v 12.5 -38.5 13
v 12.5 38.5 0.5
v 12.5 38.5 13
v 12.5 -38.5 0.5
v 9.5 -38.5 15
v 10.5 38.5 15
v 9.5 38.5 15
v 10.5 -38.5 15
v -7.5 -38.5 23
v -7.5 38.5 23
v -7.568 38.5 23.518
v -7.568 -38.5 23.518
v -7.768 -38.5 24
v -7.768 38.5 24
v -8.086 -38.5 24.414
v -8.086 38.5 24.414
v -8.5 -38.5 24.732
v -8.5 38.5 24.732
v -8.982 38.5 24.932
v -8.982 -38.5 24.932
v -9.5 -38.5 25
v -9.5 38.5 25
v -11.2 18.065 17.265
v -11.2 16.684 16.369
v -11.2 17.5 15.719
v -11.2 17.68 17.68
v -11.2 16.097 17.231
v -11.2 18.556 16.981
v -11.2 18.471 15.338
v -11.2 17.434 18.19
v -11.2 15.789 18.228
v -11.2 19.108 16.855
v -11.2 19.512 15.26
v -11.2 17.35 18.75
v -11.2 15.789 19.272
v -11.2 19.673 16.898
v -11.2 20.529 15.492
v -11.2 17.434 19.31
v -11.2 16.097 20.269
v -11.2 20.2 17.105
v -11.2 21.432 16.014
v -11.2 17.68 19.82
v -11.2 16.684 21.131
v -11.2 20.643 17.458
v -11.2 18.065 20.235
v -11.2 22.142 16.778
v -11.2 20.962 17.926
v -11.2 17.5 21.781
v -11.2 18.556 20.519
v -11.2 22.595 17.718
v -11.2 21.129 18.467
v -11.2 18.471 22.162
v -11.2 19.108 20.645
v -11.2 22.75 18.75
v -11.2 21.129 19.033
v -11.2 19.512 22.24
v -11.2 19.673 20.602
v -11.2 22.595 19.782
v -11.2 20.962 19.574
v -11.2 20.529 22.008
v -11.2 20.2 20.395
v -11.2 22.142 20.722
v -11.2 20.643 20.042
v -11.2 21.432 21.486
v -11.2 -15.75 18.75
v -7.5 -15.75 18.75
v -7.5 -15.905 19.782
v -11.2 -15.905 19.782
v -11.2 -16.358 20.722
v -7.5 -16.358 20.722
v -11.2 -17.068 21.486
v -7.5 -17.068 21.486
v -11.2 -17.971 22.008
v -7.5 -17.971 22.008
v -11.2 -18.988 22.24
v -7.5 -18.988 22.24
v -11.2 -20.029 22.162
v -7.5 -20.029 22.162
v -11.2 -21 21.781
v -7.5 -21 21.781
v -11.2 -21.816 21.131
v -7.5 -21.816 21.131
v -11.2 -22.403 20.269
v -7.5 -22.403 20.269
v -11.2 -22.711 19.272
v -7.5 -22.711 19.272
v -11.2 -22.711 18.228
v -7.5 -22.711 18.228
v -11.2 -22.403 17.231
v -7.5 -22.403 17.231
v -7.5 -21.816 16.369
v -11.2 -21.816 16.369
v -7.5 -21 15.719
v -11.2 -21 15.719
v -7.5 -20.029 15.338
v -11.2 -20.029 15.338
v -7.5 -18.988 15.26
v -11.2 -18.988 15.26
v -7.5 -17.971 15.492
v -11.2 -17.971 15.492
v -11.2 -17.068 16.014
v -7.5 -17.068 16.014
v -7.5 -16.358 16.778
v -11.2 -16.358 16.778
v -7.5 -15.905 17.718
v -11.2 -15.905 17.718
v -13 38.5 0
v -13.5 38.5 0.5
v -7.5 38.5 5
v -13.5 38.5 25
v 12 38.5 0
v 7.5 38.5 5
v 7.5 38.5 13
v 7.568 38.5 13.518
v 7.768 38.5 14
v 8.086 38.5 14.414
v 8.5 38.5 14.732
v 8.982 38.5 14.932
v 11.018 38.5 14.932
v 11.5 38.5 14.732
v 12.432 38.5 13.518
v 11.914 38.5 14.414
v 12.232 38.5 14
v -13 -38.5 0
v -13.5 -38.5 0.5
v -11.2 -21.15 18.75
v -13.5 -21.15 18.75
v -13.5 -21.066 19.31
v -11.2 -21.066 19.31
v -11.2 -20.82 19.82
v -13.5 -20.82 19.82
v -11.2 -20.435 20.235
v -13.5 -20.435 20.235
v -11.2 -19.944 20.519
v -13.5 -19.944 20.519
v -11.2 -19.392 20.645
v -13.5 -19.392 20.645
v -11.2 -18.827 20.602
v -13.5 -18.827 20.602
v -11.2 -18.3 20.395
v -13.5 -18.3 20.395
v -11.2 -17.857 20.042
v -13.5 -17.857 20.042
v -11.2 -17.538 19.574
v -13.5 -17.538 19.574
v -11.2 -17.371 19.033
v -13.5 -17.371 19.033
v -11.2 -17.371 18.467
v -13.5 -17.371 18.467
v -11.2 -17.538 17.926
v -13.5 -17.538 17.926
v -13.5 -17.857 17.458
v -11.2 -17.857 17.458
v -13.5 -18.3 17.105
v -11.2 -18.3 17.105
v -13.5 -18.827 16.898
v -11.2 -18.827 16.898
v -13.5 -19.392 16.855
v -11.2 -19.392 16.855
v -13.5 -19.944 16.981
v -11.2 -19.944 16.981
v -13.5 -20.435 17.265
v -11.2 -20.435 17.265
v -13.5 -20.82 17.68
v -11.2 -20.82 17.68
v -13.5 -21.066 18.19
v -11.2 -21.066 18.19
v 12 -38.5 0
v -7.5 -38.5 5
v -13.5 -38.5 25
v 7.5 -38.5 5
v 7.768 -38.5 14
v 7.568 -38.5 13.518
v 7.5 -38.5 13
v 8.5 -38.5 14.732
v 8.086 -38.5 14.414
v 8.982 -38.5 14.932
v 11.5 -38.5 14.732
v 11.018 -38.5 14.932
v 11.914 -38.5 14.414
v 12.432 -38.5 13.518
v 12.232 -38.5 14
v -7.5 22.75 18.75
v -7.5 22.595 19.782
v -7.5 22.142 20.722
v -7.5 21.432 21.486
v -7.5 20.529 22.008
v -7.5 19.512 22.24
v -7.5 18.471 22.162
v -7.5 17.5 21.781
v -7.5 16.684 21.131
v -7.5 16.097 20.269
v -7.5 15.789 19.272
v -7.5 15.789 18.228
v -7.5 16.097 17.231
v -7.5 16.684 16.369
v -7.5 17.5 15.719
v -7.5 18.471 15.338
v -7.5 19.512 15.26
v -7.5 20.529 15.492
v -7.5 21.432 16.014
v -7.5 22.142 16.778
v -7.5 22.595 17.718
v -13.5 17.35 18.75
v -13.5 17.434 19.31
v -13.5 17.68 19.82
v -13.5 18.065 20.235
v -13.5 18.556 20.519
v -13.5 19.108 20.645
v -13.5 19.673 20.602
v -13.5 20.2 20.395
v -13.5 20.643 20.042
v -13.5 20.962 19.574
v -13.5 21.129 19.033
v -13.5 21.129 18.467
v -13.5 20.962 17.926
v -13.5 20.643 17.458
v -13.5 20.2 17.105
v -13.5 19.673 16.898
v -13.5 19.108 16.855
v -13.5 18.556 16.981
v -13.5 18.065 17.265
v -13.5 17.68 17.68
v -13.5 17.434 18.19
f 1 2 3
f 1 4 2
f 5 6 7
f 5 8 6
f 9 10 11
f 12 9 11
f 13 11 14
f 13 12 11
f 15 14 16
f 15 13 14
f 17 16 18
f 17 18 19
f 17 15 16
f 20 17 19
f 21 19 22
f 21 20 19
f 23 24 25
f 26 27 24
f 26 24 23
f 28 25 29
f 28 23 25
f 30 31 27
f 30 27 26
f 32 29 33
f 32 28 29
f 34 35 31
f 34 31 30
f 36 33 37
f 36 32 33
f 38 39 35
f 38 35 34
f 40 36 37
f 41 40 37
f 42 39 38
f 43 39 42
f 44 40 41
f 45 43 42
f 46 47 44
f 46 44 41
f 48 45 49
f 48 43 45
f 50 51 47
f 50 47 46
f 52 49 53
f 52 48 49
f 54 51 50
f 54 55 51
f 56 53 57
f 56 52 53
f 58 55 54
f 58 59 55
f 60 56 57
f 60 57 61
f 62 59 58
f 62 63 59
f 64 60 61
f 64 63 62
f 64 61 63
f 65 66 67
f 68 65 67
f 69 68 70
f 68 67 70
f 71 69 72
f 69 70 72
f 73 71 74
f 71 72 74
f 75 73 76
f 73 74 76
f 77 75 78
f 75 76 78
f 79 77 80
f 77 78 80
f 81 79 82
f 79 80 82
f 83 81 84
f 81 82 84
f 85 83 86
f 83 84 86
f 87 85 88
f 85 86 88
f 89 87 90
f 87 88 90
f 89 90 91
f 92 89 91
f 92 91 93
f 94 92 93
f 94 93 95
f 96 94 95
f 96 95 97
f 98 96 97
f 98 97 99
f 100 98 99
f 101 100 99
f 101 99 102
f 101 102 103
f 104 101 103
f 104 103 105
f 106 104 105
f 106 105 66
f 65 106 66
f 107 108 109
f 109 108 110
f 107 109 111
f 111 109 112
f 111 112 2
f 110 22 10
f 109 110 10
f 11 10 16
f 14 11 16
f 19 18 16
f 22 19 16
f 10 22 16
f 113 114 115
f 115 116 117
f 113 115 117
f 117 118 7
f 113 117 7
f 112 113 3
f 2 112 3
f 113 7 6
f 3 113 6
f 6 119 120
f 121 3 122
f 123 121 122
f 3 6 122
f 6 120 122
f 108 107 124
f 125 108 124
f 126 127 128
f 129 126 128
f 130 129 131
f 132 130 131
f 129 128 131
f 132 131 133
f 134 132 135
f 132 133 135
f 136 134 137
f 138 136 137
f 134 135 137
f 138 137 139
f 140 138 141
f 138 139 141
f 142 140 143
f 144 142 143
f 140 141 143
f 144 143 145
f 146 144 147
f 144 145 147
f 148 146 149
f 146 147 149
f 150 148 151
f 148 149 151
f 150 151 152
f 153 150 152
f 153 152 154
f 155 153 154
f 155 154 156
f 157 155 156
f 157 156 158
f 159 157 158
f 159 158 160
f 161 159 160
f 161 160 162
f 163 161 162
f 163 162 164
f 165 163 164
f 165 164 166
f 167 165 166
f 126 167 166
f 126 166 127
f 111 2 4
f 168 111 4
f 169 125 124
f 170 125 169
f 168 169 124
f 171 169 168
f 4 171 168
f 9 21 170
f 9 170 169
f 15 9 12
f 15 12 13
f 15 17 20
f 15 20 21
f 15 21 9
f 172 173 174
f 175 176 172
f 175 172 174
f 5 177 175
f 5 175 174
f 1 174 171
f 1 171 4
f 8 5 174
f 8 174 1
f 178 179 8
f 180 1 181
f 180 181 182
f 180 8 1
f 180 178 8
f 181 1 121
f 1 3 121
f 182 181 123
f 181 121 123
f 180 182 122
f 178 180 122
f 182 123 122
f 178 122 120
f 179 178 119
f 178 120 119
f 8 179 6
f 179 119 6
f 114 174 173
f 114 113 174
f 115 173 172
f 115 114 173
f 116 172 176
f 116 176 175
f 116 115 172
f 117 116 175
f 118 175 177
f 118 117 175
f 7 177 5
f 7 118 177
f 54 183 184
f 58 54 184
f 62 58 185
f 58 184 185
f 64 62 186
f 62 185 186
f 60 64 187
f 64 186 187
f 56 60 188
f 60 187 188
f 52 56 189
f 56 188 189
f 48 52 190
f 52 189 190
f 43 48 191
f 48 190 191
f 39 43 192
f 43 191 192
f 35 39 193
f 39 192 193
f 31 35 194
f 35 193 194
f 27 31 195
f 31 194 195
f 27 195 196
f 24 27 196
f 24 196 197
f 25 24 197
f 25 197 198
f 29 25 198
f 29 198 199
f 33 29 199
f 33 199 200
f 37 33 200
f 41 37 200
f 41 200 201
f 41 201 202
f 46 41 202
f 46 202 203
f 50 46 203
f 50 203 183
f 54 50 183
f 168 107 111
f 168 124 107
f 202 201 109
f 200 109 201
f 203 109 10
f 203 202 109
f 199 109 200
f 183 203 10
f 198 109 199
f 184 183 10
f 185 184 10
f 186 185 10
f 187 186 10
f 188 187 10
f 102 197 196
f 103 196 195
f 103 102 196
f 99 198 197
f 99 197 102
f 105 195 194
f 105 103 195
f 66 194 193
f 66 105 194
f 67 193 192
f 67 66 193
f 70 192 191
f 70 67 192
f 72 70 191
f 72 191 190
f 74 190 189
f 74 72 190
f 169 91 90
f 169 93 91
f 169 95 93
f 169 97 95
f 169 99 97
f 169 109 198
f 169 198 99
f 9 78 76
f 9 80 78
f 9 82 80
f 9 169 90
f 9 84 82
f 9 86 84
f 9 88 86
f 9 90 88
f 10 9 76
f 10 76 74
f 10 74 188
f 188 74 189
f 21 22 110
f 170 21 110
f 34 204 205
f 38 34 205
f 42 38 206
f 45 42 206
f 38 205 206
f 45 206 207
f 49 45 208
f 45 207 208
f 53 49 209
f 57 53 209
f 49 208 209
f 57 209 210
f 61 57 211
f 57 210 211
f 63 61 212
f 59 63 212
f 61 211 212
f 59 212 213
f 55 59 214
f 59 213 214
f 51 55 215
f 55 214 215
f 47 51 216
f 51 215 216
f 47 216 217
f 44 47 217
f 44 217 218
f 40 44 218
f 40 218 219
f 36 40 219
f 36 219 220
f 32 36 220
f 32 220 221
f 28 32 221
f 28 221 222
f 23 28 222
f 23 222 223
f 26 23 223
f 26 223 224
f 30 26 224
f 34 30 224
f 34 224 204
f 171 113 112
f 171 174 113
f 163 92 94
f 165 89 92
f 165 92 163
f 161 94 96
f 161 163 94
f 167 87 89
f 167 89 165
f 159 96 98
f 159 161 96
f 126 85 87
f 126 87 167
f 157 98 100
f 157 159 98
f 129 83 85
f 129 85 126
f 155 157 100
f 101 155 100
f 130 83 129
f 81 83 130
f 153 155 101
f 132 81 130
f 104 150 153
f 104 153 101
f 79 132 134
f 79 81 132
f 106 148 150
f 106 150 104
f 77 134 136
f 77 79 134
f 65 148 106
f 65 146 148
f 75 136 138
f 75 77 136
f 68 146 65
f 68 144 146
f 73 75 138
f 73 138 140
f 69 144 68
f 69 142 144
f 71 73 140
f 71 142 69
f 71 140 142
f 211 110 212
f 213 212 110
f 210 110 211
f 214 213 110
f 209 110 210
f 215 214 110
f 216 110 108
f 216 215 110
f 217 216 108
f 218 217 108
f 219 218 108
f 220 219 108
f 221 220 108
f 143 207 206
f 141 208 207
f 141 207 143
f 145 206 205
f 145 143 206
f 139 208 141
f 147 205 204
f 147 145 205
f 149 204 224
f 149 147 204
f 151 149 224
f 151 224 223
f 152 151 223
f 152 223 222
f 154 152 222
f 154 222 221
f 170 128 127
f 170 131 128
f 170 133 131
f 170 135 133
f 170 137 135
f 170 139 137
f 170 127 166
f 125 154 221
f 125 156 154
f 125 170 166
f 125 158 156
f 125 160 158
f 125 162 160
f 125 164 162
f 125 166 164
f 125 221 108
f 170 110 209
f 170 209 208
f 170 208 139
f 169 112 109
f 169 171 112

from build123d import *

# Parameters (mm, degrees)
F0_W           = 7.5
F0_H           = 5
F1_DEPTH       = 38.5
F3_D           = 3.8
F3_DEPTH       = 6
F3_CBORE_D     = 7
F3_CBORE_DEPTH = 3.7
F4_R           = 2
F5_SIZE        = 0.5


with BuildPart() as f1:
    # F0 (on Front) → F1 (new body, symmetric)
    with BuildSketch(Plane.XZ):
        with Locations((3.75, 2.5)):
            Rectangle(F0_W, F0_H)
        with Locations((-3.75, 2.5)):
            Rectangle(F0_W, F0_H)
        Polygon((7.5, 5), (7.5, 0), (12.5, 0), (12.5, 15), (7.5, 15), align=None)
        Polygon((-13.5, 0), (-7.5, 0), (-7.5, 5), (-7.5, 25), (-13.5, 25), align=None)
    extrude(amount=F1_DEPTH, both=True)

    # F3
    with Locations(Plane.YZ.offset(-7.5)):
        with Locations((-19.25, 18.75), (19.25, 18.75)):
            CounterBoreHole(F3_D / 2, F3_CBORE_D / 2, F3_CBORE_DEPTH, depth=F3_DEPTH)

    # F4
    f4_edges = [f1.edges().sort_by_distance(p)[0] for p in [
        (12.5, 0, 15),
        (7.5, 0, 15),
        (-7.5, 0, 25),
    ]]
    fillet(f4_edges, radius=F4_R)

    # F5
    f5_edges = [f1.edges().sort_by_distance(p)[0] for p in [
        (12.5, 0, 0),
        (-13.5, 0, 0),
    ]]
    chamfer(f5_edges, length=F5_SIZE)


solid = f1.part
